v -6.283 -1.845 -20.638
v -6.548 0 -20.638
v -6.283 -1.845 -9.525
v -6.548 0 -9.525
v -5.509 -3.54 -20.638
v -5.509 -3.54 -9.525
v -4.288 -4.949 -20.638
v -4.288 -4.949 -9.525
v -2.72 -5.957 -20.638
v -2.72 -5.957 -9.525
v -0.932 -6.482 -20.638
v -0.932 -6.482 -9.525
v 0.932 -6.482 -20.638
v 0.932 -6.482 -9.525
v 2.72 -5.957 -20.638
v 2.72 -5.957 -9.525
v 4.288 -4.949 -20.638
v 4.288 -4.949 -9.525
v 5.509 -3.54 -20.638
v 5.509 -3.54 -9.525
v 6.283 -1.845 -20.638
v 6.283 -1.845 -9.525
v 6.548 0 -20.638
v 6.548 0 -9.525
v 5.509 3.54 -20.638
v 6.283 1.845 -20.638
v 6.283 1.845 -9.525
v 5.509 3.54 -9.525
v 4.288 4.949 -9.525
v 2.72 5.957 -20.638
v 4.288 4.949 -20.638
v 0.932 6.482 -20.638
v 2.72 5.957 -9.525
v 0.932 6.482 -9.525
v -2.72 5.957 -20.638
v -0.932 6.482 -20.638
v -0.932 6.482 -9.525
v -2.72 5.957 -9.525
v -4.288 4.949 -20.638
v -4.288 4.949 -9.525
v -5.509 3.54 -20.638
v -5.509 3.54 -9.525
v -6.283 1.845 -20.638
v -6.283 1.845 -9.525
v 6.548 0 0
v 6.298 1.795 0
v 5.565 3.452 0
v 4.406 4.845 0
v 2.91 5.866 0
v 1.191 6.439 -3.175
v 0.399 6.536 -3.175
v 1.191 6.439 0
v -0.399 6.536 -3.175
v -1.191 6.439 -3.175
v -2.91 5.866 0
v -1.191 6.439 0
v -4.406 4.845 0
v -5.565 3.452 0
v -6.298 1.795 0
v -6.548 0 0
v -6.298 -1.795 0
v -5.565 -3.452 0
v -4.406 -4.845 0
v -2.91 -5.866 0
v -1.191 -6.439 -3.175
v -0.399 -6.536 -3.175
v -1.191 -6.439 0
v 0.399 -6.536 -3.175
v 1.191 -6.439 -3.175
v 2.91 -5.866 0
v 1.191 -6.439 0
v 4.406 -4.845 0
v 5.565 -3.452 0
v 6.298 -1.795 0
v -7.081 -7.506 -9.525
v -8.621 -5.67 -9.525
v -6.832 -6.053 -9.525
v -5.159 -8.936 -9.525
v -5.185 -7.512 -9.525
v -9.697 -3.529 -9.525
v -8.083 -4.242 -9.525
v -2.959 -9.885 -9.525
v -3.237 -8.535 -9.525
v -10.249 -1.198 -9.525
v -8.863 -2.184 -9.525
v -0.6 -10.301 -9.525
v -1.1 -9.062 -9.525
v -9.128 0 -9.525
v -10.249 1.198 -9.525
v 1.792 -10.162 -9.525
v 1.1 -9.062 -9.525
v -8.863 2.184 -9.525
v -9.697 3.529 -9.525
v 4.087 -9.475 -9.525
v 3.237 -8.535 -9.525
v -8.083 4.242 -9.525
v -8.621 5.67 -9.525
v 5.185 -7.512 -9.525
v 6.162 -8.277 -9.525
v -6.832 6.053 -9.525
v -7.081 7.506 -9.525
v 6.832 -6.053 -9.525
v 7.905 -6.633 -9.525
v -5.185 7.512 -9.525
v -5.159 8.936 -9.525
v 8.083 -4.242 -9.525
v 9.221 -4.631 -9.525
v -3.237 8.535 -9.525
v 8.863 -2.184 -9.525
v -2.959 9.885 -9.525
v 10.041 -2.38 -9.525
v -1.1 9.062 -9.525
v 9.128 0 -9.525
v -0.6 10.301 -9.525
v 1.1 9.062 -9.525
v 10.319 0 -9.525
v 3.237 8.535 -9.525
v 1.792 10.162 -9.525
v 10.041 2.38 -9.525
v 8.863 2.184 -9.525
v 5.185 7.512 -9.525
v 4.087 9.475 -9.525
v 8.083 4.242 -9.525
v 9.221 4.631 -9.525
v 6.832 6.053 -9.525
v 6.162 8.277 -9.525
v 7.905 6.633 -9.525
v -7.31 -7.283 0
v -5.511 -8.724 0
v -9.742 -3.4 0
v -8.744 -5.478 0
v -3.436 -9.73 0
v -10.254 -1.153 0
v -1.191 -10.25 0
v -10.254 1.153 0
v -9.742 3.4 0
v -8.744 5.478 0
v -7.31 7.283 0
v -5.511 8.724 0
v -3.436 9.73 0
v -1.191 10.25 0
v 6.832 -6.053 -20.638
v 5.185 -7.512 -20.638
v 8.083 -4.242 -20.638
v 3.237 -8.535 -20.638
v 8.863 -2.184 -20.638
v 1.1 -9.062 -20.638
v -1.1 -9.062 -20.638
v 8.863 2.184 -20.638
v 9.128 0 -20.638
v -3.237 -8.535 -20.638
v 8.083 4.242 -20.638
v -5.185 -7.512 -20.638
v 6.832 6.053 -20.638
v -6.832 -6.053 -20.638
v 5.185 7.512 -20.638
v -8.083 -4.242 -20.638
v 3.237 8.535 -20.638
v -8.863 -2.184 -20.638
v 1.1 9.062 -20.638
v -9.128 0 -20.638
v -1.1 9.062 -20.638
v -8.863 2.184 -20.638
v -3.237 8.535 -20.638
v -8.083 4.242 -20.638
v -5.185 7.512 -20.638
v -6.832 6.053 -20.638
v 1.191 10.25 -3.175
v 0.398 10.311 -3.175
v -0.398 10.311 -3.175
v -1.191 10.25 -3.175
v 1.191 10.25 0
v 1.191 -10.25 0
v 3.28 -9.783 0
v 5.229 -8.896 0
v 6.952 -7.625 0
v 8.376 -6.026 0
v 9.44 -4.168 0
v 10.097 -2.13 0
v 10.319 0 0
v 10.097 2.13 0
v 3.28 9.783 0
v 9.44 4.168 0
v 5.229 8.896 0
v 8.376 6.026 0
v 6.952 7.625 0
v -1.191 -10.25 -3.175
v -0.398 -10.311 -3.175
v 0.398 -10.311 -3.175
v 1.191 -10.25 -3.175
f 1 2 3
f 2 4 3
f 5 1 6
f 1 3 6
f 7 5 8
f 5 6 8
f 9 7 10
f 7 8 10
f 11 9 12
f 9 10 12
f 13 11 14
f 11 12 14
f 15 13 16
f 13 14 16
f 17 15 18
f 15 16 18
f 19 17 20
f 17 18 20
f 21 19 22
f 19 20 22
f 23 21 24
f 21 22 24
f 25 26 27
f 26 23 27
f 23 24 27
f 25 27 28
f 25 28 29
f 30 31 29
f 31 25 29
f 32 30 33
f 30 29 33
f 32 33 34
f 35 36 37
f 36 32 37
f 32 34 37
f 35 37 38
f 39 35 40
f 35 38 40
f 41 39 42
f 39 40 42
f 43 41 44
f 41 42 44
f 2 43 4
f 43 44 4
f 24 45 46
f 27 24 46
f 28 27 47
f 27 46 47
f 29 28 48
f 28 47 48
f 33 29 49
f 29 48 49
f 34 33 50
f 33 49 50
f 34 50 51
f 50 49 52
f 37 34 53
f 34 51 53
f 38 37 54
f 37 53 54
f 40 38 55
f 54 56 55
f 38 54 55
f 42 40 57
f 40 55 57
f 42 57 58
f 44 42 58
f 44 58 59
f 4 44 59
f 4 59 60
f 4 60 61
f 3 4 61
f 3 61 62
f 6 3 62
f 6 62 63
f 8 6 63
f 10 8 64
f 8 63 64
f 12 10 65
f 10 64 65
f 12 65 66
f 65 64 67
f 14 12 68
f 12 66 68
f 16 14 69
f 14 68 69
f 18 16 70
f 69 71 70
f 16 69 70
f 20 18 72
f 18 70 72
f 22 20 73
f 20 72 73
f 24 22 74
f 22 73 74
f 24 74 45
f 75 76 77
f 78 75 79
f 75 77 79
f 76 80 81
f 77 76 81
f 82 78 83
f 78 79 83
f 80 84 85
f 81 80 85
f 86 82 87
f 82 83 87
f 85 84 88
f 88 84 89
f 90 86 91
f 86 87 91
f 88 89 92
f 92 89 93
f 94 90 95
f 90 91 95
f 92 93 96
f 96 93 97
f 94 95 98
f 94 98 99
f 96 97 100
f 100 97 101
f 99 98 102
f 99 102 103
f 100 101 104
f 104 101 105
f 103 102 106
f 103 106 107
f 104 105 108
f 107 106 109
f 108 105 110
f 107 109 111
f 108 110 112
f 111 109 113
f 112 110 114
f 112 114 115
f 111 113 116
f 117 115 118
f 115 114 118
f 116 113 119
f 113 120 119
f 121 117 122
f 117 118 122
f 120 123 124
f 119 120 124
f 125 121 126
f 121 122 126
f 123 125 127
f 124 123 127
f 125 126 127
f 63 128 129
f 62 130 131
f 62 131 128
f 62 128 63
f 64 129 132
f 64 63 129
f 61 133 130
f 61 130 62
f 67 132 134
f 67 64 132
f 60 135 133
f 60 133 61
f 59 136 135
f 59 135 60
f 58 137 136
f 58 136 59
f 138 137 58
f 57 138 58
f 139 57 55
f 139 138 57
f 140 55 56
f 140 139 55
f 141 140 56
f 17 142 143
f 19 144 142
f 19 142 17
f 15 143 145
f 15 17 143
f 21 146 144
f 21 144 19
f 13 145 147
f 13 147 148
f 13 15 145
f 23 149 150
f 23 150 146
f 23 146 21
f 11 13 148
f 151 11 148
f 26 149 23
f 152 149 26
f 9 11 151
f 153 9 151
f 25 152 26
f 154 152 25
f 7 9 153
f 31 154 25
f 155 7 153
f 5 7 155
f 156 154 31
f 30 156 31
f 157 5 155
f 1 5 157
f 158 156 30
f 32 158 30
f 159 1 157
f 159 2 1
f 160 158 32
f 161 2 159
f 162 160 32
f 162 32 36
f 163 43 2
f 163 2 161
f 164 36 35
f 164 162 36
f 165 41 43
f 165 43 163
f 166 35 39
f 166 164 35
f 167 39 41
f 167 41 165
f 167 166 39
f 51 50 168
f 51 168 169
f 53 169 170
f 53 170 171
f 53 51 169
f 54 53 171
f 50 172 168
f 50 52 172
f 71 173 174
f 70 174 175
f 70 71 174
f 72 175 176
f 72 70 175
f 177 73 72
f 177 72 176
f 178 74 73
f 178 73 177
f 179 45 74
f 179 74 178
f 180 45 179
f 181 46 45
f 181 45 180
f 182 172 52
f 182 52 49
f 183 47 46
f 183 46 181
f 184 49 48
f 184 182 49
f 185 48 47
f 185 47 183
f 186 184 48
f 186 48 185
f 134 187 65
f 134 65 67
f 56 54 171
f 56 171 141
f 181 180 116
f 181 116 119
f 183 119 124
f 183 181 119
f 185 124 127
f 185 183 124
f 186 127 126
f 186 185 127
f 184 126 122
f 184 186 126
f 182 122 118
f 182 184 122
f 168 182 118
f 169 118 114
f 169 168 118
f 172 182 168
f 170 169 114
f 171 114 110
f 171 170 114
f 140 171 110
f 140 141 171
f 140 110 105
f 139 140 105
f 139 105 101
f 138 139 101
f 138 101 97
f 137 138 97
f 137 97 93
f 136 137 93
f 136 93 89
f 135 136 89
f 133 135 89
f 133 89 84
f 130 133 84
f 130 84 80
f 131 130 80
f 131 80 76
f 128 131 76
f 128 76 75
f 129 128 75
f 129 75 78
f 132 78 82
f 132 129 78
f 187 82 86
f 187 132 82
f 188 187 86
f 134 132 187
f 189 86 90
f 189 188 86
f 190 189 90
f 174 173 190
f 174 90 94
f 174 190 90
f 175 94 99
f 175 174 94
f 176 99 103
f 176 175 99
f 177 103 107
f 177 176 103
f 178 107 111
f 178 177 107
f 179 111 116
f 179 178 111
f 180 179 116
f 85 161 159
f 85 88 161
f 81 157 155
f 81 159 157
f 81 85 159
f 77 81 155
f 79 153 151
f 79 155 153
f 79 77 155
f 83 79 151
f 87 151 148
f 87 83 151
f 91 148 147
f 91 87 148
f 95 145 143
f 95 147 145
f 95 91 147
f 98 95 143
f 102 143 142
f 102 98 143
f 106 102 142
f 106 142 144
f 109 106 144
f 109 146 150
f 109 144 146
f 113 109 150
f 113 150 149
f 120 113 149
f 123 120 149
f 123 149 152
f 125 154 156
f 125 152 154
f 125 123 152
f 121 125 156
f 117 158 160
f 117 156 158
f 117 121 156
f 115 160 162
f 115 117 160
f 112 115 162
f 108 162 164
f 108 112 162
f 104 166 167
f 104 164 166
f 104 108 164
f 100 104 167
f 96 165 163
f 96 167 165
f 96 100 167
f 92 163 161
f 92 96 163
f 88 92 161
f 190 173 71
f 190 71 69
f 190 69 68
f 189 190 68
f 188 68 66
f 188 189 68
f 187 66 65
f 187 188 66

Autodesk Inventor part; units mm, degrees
ref_plane "YZ Plane" through (0, 0, 0) normal (1, 0, 0) x (0, 1, 0)
ref_plane "XZ Plane" through (0, 0, 0) normal (0, 1, 0) x (-1, 0, 0)
ref_plane "XY Plane" through (0, 0, 0) normal (0, 0, 1) x (1, 0, 0)
sketch "Sketch1" plane through (0, 0, 0) normal (0, 0, 1) x (1, 0, 0)
  circle A0 centre (0, 0) radius 6.5484
  circle A1 centre (0, 0) radius 10.3188
  dimension "d0" = 20.6375
  dimension "d1" = 13.0969
extrude "Extrusion1" add sketch "Sketch1" against normal blind 9.525
sketch "Sketch2" plane through (0, 0, -9.525) normal (0, 0, -1) x (-1, 0, 0)
  circle A0 centre (0, 0) radius 6.5484 projected
  circle A1 centre (0, 0) radius 10.3188 projected
  circle A2 centre (0, 0) radius 9.1281
  dimension "d4" = 18.2563
extrude "Extrusion2" add sketch "Sketch2" along normal blind 11.1125 contours A2
sketch "Sketch3" plane through (0, 0, 0) normal (0, 1, 0) x (-1, 0, 0)
  line L0 (-10.3188, 0) -> (10.3188, 0) projected
  line L1 (-1.1906, 0) -> (-1.1906, -3.175)
  line L2 (-1.1906, -3.175) -> (1.1906, -3.175)
  line L3 (1.1906, -3.175) -> (1.1906, 0)
  point P0 (0, -3.175)
  point P1 (0, 0)
  dimension "d7" = 3.175
  dimension "d8" = 2.3813
extrude "Extrusion3" cut sketch "Sketch3" along normal through all both and the other way through all
thread "Thread1" size "13/16-20 UNEF" class "3A" standard "ANSI Unified Screw Threads" full length
properties part number "Collar" material "Steel, Mild"
